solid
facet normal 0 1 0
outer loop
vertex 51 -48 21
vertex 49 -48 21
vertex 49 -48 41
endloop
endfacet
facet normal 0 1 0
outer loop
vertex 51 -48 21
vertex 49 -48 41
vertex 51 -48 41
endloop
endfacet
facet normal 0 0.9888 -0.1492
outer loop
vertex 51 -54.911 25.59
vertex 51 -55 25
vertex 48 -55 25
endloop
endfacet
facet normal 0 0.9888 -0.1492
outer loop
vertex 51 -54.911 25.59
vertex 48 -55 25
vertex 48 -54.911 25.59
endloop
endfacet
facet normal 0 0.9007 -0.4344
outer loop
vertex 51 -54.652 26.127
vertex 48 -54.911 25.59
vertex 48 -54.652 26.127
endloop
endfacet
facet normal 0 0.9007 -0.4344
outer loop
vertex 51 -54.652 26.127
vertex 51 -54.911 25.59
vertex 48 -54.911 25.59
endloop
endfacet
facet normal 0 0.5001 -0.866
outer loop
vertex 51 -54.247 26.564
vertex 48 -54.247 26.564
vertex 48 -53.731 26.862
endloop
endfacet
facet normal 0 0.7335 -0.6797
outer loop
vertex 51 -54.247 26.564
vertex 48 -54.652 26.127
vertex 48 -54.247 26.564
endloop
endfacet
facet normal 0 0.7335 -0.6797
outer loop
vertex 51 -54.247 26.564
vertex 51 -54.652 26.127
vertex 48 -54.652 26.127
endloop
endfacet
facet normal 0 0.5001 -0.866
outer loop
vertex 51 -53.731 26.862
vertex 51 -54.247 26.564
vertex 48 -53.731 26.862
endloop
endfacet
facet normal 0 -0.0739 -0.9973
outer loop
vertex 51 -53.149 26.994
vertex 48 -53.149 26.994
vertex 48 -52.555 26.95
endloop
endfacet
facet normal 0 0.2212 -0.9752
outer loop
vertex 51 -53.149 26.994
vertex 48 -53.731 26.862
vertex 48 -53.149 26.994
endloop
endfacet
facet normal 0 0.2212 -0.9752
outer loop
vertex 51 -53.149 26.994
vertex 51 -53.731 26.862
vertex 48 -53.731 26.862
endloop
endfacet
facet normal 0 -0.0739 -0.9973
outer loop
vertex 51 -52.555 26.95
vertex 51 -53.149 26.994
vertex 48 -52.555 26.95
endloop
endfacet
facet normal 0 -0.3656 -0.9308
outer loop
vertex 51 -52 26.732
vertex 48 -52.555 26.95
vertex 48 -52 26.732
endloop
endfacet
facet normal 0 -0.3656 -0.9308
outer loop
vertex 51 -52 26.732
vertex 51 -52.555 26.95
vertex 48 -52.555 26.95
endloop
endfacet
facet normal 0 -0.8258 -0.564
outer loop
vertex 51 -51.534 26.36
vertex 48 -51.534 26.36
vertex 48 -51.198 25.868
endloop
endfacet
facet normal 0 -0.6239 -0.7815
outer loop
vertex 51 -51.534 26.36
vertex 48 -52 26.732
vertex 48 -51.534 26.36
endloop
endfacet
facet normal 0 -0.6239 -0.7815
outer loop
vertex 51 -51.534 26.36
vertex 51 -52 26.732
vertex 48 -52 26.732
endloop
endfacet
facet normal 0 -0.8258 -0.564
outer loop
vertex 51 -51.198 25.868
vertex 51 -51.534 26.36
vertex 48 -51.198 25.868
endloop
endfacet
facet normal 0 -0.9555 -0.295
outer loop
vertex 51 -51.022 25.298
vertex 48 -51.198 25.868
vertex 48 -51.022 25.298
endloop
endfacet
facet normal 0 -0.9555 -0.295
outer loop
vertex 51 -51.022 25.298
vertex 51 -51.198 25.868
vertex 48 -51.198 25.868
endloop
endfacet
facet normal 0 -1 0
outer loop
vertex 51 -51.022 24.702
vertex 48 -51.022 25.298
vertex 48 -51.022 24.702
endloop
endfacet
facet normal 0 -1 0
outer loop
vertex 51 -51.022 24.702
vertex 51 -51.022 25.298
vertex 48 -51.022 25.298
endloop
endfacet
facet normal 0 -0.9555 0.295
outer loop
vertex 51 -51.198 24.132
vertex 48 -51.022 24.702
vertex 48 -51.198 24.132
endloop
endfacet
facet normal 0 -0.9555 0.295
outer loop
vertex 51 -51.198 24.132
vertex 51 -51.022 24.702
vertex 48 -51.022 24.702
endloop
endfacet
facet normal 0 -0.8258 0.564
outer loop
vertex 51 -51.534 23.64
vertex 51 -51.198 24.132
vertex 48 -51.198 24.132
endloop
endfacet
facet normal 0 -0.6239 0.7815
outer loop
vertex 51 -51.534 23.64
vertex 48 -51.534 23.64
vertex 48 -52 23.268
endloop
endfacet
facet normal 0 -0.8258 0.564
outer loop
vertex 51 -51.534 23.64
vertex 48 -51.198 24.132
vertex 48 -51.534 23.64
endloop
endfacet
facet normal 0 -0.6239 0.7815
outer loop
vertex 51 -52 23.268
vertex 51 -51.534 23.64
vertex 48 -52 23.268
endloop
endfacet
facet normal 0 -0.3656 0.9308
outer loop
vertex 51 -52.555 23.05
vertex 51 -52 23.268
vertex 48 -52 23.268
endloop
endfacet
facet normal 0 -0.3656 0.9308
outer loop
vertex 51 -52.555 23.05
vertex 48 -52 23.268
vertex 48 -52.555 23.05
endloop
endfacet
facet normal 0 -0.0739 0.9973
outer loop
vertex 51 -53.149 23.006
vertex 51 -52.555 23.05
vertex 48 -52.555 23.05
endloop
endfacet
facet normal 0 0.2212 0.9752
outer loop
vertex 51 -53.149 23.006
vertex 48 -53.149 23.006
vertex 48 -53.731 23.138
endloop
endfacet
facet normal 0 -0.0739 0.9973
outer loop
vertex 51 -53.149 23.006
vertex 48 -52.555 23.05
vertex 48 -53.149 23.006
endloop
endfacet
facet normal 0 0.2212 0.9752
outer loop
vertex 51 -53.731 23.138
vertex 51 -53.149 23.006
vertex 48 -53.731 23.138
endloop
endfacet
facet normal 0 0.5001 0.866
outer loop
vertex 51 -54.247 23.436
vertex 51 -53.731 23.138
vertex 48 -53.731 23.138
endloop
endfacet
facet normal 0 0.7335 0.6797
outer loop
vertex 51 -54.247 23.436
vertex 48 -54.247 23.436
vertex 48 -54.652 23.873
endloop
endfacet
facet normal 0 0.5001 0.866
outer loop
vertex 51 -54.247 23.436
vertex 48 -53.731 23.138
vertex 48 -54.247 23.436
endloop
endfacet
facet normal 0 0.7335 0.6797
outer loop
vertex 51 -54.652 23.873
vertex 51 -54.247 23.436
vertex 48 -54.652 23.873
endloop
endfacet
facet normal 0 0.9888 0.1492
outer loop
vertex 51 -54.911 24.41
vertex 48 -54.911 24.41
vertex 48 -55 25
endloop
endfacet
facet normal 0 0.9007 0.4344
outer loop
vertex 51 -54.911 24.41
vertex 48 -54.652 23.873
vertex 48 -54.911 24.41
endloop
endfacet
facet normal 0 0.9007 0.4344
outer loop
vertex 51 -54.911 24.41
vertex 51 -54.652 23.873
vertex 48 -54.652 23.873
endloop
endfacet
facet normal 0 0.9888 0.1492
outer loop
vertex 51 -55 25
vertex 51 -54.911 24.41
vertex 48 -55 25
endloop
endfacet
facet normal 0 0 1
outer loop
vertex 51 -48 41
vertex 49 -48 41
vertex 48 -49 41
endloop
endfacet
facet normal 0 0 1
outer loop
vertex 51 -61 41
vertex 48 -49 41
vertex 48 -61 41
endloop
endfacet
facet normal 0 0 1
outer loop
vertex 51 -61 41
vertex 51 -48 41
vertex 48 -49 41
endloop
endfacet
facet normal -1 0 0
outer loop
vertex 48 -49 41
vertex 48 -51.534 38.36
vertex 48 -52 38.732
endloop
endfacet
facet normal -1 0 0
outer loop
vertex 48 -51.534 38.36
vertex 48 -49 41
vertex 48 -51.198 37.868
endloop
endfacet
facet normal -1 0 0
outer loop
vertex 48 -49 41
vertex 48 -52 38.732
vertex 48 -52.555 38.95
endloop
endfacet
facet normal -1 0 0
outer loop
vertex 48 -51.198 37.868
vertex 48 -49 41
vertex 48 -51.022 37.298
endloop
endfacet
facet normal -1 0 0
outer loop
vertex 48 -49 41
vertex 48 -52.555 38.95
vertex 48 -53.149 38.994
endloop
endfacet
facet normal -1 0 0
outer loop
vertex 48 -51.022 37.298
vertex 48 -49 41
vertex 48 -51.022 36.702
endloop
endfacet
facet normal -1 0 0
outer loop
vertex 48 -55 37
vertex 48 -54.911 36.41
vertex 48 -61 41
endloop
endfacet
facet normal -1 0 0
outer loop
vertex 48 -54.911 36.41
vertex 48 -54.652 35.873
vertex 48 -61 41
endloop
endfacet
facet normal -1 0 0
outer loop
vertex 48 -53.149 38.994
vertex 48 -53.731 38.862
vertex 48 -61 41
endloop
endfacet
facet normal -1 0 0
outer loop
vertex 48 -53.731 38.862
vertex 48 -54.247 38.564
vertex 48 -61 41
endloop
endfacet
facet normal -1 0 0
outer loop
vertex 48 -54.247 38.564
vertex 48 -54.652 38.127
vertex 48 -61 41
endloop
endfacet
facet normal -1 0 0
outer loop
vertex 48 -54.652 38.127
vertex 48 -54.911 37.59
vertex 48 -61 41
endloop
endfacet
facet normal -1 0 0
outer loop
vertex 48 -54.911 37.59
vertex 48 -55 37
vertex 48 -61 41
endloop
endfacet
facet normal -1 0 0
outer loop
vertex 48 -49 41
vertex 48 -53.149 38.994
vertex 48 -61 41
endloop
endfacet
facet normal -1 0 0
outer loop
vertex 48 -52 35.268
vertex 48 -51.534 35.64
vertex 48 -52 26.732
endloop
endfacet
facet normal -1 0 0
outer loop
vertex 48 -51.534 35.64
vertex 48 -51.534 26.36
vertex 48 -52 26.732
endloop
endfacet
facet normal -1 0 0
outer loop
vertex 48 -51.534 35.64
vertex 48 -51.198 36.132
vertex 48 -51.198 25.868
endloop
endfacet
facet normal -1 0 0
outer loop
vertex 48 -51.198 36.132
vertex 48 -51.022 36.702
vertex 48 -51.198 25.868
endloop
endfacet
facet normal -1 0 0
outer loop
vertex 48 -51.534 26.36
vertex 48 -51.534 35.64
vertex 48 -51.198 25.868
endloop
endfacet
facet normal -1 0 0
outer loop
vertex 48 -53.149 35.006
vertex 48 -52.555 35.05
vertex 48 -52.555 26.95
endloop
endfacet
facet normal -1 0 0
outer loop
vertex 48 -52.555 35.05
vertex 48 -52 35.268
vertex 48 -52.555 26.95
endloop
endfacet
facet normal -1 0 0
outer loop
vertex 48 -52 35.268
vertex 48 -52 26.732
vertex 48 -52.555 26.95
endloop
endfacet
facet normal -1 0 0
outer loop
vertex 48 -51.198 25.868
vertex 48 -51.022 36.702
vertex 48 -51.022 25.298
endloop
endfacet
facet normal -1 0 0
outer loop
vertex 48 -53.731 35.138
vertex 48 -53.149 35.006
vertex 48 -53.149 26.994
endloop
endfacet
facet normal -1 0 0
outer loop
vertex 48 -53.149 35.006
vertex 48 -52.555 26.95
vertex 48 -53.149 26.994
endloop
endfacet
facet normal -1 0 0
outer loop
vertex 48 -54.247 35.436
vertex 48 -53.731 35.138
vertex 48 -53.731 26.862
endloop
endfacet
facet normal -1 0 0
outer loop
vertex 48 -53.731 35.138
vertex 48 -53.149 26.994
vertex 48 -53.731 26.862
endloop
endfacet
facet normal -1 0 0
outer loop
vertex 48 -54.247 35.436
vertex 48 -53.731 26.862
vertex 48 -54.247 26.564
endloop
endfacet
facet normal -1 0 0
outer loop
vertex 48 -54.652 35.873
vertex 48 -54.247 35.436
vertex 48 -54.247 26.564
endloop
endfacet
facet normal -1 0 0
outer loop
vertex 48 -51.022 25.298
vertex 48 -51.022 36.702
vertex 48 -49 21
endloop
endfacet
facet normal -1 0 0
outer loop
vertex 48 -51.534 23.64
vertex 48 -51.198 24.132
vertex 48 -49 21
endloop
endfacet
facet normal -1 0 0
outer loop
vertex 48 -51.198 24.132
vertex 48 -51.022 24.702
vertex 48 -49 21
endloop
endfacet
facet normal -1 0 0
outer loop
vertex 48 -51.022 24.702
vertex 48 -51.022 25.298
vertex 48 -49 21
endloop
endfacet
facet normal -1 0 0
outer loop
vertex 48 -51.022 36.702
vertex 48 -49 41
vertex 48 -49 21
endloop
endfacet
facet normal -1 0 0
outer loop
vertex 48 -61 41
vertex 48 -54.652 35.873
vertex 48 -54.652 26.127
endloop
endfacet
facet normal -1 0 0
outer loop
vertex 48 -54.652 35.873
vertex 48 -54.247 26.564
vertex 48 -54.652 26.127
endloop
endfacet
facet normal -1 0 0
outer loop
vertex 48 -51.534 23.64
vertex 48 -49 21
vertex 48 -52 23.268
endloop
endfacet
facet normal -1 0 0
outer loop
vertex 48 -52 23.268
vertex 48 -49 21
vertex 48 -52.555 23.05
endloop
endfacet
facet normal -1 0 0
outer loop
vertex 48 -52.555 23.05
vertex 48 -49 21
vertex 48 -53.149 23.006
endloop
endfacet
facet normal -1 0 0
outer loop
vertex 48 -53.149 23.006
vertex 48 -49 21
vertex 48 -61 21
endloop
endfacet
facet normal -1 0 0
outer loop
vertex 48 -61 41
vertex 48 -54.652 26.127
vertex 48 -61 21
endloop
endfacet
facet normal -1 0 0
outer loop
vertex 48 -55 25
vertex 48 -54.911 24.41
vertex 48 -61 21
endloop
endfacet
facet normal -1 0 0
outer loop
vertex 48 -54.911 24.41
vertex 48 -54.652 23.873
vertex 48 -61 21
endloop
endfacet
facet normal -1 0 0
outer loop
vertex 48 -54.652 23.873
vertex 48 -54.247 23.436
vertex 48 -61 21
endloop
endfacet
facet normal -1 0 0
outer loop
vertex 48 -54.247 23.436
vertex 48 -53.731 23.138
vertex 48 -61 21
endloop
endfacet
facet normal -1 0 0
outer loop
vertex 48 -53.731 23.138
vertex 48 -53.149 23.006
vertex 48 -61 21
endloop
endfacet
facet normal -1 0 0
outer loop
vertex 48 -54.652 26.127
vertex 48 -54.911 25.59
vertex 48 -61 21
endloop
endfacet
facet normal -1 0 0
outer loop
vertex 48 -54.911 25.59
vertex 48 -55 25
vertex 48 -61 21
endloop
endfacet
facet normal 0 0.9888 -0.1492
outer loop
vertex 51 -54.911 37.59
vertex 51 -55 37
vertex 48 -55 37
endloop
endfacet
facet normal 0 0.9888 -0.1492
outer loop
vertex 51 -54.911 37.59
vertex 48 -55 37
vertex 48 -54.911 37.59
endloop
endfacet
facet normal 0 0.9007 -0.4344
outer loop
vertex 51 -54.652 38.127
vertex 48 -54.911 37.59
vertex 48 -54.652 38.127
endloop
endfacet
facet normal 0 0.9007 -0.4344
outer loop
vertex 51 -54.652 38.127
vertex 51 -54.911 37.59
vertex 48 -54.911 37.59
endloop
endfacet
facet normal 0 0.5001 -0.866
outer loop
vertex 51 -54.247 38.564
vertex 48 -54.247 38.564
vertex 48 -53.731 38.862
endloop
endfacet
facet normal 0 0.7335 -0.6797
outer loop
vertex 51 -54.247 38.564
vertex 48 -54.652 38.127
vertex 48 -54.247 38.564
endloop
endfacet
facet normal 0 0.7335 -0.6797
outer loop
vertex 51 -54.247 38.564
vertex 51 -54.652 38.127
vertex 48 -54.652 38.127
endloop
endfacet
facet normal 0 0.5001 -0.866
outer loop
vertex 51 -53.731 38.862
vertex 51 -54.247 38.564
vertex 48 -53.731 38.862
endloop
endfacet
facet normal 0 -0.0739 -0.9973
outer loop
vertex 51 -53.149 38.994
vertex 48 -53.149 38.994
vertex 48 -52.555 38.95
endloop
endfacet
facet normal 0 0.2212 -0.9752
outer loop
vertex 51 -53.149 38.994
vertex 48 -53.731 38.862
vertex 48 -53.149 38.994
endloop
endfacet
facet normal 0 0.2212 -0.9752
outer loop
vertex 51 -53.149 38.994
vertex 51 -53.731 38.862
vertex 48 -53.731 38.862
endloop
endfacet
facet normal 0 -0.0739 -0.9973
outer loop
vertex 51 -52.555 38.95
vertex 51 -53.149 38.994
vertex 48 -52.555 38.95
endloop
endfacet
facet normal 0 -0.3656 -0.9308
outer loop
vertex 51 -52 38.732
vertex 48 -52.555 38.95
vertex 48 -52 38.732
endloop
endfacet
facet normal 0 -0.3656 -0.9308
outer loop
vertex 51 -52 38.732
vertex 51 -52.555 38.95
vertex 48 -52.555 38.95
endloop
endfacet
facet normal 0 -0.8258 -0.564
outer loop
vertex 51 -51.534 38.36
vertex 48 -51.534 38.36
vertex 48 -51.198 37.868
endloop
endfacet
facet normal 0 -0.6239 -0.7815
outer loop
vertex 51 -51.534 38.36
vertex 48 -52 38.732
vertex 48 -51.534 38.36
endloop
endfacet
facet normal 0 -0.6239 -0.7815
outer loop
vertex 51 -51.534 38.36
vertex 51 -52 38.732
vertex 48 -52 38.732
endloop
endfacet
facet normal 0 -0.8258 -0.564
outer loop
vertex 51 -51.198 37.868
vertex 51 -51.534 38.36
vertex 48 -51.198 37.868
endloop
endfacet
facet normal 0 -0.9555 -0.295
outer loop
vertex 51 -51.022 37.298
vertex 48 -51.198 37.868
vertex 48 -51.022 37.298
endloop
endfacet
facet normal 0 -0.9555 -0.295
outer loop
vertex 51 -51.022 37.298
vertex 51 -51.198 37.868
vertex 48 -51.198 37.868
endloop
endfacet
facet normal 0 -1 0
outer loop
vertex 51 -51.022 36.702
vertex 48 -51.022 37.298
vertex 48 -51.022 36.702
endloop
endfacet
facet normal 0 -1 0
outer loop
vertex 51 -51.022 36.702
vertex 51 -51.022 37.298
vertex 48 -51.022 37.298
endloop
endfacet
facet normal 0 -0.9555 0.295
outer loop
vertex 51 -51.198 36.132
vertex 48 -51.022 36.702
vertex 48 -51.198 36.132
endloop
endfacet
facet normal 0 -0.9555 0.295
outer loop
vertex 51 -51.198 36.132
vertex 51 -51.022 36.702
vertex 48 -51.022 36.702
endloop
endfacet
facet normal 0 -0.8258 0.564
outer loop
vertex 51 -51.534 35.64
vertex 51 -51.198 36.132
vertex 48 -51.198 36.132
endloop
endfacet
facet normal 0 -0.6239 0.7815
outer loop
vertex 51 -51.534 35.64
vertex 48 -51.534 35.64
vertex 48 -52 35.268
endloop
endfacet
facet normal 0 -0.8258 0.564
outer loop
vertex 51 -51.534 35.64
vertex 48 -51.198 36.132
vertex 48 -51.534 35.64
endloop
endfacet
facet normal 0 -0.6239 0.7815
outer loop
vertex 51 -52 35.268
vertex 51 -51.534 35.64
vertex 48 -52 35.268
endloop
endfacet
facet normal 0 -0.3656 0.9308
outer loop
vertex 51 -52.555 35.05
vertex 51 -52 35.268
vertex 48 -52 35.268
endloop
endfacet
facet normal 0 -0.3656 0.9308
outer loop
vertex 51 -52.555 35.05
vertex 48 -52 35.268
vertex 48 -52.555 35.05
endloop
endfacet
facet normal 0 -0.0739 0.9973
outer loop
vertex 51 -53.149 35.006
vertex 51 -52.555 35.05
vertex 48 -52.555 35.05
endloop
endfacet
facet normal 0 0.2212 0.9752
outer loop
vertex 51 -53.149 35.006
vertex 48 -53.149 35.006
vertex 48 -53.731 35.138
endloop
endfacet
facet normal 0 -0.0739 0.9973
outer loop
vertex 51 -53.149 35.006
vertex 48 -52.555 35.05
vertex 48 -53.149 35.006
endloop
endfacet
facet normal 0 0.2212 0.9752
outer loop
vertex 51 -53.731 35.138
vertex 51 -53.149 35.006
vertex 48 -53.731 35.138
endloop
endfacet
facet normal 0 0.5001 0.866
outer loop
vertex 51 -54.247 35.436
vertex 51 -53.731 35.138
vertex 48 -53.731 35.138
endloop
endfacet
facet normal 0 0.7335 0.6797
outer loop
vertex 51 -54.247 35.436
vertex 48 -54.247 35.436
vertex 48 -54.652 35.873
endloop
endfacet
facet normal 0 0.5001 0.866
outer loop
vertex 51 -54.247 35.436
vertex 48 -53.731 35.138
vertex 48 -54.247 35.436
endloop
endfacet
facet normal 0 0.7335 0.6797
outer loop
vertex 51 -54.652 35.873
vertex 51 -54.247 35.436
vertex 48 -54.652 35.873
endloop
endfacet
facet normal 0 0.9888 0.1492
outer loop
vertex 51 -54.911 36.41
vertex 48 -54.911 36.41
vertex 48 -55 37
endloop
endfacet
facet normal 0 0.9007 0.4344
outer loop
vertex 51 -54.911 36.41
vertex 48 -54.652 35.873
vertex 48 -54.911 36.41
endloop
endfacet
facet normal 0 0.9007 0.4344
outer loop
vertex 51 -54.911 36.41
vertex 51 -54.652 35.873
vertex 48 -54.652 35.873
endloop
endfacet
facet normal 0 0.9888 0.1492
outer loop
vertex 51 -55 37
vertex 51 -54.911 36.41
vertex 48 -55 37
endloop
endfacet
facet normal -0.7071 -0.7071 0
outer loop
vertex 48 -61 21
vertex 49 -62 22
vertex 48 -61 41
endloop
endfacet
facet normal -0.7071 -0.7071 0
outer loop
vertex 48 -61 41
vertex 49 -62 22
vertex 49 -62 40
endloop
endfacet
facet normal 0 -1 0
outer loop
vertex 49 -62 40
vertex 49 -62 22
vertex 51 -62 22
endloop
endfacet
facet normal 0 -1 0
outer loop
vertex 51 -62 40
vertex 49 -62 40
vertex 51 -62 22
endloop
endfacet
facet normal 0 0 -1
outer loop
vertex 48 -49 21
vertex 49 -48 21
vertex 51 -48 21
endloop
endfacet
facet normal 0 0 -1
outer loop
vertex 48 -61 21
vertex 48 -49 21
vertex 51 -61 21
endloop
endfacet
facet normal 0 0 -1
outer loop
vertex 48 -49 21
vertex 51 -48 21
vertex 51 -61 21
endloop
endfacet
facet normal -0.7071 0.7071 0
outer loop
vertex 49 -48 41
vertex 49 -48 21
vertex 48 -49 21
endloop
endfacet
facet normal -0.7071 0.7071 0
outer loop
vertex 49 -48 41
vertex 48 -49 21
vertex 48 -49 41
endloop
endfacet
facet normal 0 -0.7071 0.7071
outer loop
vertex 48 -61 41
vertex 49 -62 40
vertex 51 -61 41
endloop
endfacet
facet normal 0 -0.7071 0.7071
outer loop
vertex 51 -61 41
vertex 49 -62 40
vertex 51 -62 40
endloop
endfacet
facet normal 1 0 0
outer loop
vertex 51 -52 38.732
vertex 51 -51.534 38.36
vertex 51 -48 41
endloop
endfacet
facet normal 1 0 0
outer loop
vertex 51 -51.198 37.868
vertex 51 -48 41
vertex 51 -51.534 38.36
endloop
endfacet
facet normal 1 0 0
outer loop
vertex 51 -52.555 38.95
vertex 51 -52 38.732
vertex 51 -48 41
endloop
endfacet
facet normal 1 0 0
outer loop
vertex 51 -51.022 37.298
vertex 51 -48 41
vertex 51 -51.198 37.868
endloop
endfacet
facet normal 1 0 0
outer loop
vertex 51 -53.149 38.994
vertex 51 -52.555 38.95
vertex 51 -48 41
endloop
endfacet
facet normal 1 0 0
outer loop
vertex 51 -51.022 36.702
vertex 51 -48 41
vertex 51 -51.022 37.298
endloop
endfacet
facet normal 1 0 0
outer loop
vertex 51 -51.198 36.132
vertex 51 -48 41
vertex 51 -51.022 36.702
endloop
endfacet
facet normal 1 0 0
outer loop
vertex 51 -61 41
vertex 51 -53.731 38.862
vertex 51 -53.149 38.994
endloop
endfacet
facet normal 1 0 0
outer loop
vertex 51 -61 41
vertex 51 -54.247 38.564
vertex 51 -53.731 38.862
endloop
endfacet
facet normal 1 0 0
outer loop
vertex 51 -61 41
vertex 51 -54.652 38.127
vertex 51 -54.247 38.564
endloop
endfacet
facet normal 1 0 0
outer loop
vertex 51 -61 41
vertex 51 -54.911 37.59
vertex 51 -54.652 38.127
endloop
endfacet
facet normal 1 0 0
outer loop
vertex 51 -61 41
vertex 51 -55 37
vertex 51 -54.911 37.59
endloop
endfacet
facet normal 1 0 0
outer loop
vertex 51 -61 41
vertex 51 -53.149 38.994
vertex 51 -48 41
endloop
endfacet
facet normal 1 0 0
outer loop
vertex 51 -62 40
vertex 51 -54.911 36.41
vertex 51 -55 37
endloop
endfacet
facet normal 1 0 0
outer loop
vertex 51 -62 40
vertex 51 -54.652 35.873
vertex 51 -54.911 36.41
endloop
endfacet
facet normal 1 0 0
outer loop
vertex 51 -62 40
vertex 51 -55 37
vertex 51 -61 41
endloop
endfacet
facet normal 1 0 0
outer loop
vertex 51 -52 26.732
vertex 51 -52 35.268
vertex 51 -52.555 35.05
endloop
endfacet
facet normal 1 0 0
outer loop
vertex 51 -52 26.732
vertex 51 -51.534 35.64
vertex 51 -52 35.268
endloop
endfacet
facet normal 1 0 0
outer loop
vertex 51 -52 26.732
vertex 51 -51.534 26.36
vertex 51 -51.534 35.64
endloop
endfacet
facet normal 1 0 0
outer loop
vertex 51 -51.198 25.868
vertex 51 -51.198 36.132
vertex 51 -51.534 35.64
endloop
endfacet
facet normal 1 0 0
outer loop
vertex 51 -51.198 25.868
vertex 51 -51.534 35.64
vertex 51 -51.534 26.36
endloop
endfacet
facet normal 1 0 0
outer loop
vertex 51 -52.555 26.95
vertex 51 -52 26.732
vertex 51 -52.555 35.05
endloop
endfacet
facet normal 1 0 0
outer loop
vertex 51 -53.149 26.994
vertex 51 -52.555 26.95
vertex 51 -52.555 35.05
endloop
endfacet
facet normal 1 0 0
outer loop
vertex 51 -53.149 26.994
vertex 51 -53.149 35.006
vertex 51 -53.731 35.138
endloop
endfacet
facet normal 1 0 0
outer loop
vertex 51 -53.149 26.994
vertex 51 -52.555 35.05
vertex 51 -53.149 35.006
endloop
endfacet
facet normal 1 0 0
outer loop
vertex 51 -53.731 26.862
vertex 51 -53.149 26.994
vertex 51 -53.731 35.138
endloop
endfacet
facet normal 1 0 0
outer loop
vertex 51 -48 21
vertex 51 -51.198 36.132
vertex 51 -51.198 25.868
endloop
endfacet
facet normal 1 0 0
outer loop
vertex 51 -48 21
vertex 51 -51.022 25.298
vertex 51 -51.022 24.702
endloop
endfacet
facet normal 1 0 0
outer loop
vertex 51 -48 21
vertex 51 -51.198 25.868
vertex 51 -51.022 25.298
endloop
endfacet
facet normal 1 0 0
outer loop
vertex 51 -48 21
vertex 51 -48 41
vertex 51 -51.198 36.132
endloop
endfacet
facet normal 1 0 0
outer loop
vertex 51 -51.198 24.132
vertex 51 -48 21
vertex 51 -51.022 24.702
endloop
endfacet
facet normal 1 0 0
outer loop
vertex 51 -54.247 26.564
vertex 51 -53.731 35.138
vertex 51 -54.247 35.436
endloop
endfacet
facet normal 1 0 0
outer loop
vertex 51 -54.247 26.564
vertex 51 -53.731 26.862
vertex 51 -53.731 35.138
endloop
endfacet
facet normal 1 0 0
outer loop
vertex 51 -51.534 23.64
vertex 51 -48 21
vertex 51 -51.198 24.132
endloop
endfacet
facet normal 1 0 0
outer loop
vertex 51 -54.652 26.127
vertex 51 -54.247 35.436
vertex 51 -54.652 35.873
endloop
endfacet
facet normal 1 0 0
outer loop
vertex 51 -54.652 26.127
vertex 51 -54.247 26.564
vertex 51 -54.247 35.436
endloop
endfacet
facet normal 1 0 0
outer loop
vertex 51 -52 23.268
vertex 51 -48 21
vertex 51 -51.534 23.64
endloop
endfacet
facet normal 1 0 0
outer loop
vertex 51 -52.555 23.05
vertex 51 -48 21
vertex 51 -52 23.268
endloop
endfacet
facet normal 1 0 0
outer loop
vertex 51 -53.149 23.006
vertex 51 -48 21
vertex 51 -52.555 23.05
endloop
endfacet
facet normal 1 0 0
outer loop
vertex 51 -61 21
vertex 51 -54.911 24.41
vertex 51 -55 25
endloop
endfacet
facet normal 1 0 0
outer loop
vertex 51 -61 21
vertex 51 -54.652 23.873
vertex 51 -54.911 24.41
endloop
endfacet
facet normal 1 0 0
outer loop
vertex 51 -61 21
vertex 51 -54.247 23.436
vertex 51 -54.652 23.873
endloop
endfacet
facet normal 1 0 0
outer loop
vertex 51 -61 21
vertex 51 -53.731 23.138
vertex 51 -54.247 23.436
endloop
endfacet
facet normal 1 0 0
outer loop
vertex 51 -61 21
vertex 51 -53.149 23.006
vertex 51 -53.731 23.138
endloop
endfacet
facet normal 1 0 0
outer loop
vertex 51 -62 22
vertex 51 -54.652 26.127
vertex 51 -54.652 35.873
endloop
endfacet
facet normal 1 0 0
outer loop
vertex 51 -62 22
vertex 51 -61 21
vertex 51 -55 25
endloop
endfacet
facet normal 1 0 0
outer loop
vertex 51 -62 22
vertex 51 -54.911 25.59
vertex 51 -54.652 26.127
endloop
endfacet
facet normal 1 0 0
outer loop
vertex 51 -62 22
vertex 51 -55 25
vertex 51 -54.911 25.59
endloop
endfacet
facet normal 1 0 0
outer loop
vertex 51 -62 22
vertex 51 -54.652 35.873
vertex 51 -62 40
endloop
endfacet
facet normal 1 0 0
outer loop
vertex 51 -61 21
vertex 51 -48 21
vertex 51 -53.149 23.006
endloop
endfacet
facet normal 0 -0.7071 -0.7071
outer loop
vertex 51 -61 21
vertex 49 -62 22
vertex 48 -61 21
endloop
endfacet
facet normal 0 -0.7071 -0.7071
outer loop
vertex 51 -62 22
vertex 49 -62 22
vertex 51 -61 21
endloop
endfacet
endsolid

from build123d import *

# Parameters (mm, degrees)
CYLINDER053_R          = 2
CYLINDER053_DEPTH      = 10
CYLINDER054_R          = 2
CYLINDER054_DEPTH      = 10
BOX014_W               = 14
BOX014_H               = 3
BOX014_DEPTH           = 20
BOX014_PLACEMENT_ANGLE = -90
CHAMFER015_SIZE        = 1
CHAMFER017_SIZE        = 1


with BuildPart() as cilindro050:
    # Cylinder053 → Cylinder053 (new body)
    with BuildSketch(Plane(origin=(63, -53, 25), x_dir=(0, -1, 0), z_dir=(-1, 0, 0))):
        Circle(CYLINDER053_R)
    extrude(amount=CYLINDER053_DEPTH)


with BuildPart() as fusion013:
    # Cylinder054 → Cylinder054 (new body)
    with BuildSketch(Plane(origin=(63, -53, 37), x_dir=(0, -1, 0), z_dir=(-1, 0, 0))):
        Circle(CYLINDER054_R)
    extrude(amount=CYLINDER054_DEPTH)

    # Fusion013: union Cilindro050
    add(cilindro050.part)


with BuildPart() as presa004:
    # Box014 → Box014 (new body)
    with BuildSketch(Plane.XY):
        with Locations((7, 1.5)):
            Rectangle(BOX014_W, BOX014_H)
    extrude(amount=BOX014_DEPTH)


with BuildPart() as presa004_1:
    # Box014 placement: moved
    add(presa004.part.moved(Location((55, -48, 21))).rotate(Axis((55, -48, 21), (0, 0, 1)), BOX014_PLACEMENT_ANGLE))

    # Cut041: cut Fusion013
    add(fusion013.part, mode=Mode.SUBTRACT)


with BuildPart() as presa004_2:
    # Cut041 placement: moved
    add(presa004_1.part.moved(Location((-7, 0, 0))))

    # Chamfer015
    chamfer015_edges = [presa004_2.edges().sort_by_distance(p)[0] for p in [
        (49.5, -62, 41),
        (49.5, -62, 21),
    ]]
    chamfer(chamfer015_edges, length=CHAMFER015_SIZE)

    # Chamfer017
    chamfer017_edges = [presa004_2.edges().sort_by_distance(p)[0] for p in [
        (48, -48, 31),
        (48, -62, 31),
    ]]
    chamfer(chamfer017_edges, length=CHAMFER017_SIZE)


solid = presa004_2.part
